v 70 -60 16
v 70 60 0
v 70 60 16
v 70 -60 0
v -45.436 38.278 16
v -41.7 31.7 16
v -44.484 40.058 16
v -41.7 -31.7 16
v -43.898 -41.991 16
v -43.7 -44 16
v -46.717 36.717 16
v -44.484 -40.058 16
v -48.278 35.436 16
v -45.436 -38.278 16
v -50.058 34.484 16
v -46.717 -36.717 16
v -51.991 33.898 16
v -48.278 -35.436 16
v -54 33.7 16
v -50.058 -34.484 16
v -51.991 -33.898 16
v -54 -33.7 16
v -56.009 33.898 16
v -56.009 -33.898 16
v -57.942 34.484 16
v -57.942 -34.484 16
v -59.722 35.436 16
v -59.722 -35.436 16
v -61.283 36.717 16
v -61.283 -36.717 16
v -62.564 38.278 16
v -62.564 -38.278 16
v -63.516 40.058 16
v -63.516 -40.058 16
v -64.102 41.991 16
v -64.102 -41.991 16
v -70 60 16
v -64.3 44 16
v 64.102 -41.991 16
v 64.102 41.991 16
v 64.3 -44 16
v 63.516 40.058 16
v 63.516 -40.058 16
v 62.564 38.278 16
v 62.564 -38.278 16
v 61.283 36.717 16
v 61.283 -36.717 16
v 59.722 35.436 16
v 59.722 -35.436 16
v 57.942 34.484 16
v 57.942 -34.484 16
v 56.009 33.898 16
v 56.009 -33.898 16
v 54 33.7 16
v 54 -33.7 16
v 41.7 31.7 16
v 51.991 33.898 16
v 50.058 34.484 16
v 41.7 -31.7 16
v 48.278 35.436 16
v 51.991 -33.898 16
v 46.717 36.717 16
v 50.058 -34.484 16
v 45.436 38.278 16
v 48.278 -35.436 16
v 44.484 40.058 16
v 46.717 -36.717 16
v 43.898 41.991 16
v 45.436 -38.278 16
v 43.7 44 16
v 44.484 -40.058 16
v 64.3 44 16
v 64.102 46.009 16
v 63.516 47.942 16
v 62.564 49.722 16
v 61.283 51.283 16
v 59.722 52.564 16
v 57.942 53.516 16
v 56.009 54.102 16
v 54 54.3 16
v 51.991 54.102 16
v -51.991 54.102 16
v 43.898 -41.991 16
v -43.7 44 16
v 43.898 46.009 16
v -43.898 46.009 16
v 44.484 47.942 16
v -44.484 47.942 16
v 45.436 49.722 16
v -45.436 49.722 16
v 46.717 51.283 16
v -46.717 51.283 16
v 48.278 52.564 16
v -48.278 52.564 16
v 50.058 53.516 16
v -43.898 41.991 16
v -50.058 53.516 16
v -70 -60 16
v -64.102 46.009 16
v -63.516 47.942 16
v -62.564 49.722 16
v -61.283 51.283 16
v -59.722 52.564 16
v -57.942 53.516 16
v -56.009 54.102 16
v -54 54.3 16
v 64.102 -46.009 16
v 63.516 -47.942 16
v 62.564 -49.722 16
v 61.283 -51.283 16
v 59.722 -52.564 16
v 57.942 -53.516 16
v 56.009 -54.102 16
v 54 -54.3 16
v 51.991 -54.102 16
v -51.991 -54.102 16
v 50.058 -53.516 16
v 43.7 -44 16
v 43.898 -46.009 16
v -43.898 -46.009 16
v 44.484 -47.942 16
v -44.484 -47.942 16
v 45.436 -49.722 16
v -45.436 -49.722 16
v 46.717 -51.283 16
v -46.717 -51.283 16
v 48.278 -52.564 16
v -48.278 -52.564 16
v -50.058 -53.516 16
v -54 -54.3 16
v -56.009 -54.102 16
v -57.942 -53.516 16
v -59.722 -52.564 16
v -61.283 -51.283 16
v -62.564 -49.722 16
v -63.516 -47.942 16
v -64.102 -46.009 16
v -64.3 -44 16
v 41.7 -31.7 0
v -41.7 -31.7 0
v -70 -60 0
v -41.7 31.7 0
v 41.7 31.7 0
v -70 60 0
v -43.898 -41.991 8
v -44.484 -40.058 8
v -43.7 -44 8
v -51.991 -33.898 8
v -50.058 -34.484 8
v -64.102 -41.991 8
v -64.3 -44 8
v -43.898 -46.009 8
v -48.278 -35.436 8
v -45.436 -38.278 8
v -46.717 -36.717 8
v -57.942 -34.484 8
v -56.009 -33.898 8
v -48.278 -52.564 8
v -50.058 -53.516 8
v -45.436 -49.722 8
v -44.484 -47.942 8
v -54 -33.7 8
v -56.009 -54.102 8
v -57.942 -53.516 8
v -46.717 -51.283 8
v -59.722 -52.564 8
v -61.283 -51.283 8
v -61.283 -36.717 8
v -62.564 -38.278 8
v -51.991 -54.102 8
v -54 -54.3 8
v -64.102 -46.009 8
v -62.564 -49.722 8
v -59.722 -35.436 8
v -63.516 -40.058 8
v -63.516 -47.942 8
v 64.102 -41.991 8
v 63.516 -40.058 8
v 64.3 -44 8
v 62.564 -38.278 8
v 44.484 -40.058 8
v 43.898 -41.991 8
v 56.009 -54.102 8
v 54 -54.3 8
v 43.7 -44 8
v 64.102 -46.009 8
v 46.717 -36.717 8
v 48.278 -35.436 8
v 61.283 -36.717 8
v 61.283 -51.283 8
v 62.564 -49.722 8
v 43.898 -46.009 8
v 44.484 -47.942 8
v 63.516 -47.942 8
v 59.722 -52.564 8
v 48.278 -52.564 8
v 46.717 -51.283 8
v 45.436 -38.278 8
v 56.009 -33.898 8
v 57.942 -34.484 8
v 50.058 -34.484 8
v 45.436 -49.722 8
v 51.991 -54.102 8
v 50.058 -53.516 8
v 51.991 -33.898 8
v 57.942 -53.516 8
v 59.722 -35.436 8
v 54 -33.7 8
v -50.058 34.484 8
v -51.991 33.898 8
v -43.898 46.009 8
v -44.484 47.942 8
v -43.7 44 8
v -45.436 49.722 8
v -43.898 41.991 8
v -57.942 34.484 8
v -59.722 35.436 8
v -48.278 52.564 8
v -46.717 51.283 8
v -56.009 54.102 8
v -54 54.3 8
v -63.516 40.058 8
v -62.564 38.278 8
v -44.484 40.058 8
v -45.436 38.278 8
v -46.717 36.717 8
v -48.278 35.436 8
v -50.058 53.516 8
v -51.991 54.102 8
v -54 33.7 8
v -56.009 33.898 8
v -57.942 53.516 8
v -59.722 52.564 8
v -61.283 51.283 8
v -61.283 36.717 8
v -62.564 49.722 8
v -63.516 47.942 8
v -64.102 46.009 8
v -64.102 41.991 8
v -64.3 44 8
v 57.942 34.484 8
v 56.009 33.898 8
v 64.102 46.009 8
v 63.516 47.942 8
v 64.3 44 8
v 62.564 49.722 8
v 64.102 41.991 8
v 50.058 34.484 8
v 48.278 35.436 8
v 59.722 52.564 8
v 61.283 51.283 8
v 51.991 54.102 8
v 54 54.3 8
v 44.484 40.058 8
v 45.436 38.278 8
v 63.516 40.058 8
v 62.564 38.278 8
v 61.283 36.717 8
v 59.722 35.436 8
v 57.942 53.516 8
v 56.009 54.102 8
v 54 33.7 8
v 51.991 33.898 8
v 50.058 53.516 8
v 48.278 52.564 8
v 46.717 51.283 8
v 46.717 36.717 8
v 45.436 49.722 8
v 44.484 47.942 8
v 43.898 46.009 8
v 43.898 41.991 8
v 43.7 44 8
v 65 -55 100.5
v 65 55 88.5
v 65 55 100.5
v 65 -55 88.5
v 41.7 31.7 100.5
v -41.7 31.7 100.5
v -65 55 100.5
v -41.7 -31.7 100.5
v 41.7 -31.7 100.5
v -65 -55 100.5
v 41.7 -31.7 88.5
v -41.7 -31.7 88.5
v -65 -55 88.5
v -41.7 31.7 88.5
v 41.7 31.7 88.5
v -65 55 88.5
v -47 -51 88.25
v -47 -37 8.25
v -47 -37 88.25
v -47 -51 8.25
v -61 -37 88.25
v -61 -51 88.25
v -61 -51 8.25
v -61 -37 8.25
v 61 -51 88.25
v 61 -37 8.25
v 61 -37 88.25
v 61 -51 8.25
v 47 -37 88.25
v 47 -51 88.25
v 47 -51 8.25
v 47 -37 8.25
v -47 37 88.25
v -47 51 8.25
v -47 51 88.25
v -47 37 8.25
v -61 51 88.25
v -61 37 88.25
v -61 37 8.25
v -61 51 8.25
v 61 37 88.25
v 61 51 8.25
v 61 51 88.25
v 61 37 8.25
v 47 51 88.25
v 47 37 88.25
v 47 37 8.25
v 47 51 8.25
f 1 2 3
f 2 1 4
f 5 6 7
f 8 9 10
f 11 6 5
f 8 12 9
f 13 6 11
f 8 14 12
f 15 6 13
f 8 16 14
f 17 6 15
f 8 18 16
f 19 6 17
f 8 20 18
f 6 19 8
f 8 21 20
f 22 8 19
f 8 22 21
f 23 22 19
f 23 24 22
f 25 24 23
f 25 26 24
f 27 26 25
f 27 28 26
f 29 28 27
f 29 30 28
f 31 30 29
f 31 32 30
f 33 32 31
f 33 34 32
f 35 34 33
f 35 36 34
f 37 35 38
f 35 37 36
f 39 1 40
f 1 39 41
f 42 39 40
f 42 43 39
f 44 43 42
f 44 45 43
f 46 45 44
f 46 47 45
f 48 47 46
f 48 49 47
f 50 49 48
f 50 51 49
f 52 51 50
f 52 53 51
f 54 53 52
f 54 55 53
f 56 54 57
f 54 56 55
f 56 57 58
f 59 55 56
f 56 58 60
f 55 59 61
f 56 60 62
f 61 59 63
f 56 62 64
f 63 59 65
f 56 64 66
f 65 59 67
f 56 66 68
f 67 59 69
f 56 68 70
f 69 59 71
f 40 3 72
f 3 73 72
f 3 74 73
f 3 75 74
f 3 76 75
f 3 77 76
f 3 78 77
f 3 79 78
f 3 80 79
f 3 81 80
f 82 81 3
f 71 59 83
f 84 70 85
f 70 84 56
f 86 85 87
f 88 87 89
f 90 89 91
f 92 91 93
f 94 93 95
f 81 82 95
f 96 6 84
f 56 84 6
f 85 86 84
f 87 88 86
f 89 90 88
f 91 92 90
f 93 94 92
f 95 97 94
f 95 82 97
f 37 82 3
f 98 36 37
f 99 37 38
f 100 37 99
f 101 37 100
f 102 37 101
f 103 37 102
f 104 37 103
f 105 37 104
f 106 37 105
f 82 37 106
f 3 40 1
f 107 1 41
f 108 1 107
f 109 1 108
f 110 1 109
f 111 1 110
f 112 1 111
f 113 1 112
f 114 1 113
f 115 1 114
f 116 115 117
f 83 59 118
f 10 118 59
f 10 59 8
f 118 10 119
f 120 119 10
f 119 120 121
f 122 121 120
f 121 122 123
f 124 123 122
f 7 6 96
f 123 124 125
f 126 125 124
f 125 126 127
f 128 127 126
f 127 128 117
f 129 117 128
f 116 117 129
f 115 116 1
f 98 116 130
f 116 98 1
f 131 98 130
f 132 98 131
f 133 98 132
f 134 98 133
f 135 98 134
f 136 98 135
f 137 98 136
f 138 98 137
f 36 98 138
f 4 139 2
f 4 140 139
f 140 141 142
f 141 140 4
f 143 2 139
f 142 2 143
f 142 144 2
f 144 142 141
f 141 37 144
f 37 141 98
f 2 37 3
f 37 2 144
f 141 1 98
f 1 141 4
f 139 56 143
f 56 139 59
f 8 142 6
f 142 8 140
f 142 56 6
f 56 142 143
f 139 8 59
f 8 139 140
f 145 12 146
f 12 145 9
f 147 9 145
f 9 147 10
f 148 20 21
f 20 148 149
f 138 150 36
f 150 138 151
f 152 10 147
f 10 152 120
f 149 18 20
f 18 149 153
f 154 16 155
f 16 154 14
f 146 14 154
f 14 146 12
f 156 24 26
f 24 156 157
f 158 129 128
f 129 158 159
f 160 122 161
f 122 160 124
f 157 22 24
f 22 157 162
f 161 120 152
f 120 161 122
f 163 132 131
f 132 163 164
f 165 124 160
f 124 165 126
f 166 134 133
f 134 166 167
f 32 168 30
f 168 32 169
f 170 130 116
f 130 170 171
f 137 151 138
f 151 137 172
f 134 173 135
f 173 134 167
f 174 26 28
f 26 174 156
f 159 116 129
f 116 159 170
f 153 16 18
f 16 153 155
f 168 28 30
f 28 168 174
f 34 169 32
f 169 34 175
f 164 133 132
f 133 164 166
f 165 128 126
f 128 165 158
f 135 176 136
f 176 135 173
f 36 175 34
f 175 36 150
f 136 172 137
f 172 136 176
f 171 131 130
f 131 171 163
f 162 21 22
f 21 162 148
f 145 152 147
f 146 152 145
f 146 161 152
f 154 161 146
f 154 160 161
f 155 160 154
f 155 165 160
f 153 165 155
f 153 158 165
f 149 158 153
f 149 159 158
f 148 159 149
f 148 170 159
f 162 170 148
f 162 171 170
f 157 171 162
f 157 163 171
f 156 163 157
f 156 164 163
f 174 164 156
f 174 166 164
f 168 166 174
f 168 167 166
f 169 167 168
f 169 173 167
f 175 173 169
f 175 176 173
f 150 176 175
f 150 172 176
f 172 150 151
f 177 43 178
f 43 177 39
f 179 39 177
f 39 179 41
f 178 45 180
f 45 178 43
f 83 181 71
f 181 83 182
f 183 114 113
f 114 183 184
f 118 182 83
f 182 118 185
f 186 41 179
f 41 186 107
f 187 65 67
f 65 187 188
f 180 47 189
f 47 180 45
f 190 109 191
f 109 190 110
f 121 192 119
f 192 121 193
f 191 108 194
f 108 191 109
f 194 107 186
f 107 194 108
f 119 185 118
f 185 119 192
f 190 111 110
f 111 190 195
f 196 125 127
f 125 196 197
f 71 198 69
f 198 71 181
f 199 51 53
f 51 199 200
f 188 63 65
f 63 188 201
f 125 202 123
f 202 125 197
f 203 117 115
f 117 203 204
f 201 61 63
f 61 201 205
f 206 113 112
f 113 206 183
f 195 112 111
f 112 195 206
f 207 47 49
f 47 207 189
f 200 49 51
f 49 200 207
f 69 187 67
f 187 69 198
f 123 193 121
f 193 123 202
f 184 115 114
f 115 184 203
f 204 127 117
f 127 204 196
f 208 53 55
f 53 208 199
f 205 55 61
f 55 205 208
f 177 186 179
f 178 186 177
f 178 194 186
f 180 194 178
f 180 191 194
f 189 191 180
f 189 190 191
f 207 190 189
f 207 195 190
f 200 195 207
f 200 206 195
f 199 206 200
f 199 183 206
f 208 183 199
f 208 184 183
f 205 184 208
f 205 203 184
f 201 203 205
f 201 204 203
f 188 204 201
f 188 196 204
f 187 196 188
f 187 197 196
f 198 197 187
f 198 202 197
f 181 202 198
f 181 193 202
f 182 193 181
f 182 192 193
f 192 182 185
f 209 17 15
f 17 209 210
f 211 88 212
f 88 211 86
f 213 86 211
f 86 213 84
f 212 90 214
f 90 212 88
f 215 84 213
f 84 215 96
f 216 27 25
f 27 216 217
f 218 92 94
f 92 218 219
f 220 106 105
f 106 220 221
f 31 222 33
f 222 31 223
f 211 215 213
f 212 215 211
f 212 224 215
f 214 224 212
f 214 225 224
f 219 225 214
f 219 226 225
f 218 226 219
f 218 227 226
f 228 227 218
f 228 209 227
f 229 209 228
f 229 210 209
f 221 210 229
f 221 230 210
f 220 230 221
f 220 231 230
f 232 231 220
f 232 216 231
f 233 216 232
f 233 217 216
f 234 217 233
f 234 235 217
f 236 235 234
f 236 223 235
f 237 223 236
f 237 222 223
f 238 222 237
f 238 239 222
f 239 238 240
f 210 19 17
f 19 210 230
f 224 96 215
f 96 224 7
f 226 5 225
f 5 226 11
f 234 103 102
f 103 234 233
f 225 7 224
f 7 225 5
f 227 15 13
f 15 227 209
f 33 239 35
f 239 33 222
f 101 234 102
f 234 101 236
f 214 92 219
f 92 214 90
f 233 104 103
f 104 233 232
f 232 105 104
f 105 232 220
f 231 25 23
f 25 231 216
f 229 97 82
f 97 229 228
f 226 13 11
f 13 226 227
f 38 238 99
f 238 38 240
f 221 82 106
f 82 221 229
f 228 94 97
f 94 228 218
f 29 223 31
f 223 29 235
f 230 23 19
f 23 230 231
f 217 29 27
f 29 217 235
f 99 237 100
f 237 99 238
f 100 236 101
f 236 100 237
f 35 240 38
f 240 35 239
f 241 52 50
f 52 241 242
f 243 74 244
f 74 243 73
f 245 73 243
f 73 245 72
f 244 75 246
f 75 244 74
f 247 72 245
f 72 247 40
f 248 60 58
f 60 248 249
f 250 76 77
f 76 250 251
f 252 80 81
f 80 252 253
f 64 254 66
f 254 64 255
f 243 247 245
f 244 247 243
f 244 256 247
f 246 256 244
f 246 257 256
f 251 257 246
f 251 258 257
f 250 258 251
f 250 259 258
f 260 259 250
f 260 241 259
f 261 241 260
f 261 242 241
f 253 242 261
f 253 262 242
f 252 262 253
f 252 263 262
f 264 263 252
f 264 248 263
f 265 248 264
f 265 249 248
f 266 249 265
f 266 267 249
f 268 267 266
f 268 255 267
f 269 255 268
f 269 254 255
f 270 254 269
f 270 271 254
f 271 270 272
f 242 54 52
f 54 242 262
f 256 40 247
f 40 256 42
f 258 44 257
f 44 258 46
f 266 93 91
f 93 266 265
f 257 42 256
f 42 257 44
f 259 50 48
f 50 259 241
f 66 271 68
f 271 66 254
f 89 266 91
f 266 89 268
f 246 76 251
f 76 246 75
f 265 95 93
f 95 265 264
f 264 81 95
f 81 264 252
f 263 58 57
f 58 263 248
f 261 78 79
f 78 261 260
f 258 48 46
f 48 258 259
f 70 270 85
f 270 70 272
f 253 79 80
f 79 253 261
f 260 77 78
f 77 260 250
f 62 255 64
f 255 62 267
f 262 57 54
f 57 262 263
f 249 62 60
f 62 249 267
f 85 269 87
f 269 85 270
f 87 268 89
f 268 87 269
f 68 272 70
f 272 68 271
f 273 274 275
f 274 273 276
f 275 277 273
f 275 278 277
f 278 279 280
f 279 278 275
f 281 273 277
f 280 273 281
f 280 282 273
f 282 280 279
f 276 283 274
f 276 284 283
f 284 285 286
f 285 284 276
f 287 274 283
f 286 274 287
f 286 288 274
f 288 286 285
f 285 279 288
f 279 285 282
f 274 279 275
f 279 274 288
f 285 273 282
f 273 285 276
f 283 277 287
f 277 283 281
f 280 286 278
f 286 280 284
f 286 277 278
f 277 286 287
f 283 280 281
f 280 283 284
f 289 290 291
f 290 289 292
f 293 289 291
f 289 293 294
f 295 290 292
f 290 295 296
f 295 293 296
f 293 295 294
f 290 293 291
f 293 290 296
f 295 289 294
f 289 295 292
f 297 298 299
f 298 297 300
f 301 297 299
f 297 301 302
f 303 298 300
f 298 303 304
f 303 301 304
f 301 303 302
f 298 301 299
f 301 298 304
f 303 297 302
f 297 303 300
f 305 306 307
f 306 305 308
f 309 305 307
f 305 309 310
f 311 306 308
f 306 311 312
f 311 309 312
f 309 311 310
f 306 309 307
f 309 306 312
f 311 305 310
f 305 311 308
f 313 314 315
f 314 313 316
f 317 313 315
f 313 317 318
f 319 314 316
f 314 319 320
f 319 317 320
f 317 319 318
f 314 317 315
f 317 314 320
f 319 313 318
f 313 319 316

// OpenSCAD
$fn = 32;

// ------------------------------------------------------------------------
// Frame cube: base 140 x 120 mm, posts 80 mm tall
// Every part is its own module, assembly() places every instance.
// ------------------------------------------------------------------------

// --- part 1 ---
module base_frame() {
  difference() {
    translate([-70, -60, 0]) cube([140, 120, 16]);
    translate([-41.7, -31.7, -1]) cube([83.4, 63.4, 18]);
    translate([-54, -44, 8]) cylinder(h = 9, d = 20.6);
    translate([54, -44, 8]) cylinder(h = 9, d = 20.6);
    translate([-54, 44, 8]) cylinder(h = 9, d = 20.6);
    translate([54, 44, 8]) cylinder(h = 9, d = 20.6);
  }
}

// --- part 2 ---
module corner_post() {
  translate([-7, -7, 0]) cube([14, 14, 80]);
}

// --- part 3 ---
module top_frame() {
  difference() {
    translate([-65, -55, 0]) cube([130, 110, 12]);
    translate([-41.7, -31.7, -1]) cube([83.4, 63.4, 14]);
  }
}

// --- assembly ---
module assembly() {
  color([0.80, 0.24, 0.20]) translate([0, 0, 0]) rotate([0, 0, 0]) base_frame();
  color([0.20, 0.45, 0.75]) translate([-54, -44, 8.25]) rotate([0, 0, 0]) corner_post();
  color([0.25, 0.62, 0.32]) translate([54, -44, 8.25]) rotate([0, 0, 0]) corner_post();
  color([0.92, 0.70, 0.18]) translate([-54, 44, 8.25]) rotate([0, 0, 0]) corner_post();
  color([0.58, 0.35, 0.70]) translate([54, 44, 8.25]) rotate([0, 0, 0]) corner_post();
  color([0.16, 0.66, 0.66]) translate([0, 0, 88.5]) rotate([0, 0, 0]) top_frame();
}

assembly();
